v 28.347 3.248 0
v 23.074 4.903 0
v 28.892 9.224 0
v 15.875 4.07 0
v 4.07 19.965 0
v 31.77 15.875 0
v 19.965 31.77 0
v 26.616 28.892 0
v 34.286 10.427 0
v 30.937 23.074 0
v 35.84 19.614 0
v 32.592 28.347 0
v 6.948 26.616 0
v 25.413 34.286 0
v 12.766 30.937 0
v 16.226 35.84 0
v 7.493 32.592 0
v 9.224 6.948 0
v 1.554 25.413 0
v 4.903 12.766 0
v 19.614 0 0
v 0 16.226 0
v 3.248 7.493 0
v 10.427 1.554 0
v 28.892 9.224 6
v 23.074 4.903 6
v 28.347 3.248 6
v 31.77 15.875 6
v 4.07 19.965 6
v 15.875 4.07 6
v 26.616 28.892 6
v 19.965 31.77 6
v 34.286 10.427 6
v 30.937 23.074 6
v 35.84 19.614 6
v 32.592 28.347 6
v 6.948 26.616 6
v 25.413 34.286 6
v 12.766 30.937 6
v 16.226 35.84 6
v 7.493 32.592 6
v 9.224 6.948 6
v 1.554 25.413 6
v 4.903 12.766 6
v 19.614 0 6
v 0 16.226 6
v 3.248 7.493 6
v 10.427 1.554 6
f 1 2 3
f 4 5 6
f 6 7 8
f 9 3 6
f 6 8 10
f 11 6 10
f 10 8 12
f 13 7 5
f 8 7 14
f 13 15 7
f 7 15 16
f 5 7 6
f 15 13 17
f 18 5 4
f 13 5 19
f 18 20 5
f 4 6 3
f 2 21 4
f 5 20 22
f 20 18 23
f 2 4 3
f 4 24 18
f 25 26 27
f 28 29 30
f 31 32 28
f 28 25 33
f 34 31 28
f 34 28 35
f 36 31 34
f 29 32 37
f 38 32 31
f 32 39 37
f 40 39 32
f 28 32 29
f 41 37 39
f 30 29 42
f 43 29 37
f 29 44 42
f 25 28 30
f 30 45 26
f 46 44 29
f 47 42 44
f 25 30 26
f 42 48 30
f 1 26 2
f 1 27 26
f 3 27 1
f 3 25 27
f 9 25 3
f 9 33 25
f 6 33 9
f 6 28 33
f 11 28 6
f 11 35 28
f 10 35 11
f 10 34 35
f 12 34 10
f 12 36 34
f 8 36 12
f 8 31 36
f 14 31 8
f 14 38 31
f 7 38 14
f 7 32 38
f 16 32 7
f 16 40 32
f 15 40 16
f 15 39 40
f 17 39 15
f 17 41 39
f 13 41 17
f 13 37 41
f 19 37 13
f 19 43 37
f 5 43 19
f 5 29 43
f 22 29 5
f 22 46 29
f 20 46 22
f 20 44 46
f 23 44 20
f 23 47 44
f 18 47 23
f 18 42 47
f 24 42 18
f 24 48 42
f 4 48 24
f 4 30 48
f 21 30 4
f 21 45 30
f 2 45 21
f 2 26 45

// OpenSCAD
$fn = 32;

// ----------------------------------------------------------------------
// Chain sprocket: 12 teeth, 14 mm root radius
// ----------------------------------------------------------------------

// --- parameters (mm) ---
profile_height = 6;       // extrusion height
profile_points = 24;      // points of the closed outline

profile = [[31.77, 15.875], [35.84, 19.614], [30.937, 23.074], [32.592, 28.347], [26.616, 28.892], [25.413, 34.286], [19.965, 31.77], [16.226, 35.84], [12.766, 30.937], [7.493, 32.592], [6.948, 26.616], [1.554, 25.413], [4.07, 19.965], [0, 16.226], [4.903, 12.766], [3.248, 7.493], [9.224, 6.948], [10.427, 1.554], [15.875, 4.07], [19.614, 0], [23.074, 4.903], [28.347, 3.248], [28.892, 9.224], [34.286, 10.427]];  // single closed polygon, 24 points, counter clockwise

// --- the one profile operation ---
linear_extrude(height = profile_height) polygon(points = profile);
